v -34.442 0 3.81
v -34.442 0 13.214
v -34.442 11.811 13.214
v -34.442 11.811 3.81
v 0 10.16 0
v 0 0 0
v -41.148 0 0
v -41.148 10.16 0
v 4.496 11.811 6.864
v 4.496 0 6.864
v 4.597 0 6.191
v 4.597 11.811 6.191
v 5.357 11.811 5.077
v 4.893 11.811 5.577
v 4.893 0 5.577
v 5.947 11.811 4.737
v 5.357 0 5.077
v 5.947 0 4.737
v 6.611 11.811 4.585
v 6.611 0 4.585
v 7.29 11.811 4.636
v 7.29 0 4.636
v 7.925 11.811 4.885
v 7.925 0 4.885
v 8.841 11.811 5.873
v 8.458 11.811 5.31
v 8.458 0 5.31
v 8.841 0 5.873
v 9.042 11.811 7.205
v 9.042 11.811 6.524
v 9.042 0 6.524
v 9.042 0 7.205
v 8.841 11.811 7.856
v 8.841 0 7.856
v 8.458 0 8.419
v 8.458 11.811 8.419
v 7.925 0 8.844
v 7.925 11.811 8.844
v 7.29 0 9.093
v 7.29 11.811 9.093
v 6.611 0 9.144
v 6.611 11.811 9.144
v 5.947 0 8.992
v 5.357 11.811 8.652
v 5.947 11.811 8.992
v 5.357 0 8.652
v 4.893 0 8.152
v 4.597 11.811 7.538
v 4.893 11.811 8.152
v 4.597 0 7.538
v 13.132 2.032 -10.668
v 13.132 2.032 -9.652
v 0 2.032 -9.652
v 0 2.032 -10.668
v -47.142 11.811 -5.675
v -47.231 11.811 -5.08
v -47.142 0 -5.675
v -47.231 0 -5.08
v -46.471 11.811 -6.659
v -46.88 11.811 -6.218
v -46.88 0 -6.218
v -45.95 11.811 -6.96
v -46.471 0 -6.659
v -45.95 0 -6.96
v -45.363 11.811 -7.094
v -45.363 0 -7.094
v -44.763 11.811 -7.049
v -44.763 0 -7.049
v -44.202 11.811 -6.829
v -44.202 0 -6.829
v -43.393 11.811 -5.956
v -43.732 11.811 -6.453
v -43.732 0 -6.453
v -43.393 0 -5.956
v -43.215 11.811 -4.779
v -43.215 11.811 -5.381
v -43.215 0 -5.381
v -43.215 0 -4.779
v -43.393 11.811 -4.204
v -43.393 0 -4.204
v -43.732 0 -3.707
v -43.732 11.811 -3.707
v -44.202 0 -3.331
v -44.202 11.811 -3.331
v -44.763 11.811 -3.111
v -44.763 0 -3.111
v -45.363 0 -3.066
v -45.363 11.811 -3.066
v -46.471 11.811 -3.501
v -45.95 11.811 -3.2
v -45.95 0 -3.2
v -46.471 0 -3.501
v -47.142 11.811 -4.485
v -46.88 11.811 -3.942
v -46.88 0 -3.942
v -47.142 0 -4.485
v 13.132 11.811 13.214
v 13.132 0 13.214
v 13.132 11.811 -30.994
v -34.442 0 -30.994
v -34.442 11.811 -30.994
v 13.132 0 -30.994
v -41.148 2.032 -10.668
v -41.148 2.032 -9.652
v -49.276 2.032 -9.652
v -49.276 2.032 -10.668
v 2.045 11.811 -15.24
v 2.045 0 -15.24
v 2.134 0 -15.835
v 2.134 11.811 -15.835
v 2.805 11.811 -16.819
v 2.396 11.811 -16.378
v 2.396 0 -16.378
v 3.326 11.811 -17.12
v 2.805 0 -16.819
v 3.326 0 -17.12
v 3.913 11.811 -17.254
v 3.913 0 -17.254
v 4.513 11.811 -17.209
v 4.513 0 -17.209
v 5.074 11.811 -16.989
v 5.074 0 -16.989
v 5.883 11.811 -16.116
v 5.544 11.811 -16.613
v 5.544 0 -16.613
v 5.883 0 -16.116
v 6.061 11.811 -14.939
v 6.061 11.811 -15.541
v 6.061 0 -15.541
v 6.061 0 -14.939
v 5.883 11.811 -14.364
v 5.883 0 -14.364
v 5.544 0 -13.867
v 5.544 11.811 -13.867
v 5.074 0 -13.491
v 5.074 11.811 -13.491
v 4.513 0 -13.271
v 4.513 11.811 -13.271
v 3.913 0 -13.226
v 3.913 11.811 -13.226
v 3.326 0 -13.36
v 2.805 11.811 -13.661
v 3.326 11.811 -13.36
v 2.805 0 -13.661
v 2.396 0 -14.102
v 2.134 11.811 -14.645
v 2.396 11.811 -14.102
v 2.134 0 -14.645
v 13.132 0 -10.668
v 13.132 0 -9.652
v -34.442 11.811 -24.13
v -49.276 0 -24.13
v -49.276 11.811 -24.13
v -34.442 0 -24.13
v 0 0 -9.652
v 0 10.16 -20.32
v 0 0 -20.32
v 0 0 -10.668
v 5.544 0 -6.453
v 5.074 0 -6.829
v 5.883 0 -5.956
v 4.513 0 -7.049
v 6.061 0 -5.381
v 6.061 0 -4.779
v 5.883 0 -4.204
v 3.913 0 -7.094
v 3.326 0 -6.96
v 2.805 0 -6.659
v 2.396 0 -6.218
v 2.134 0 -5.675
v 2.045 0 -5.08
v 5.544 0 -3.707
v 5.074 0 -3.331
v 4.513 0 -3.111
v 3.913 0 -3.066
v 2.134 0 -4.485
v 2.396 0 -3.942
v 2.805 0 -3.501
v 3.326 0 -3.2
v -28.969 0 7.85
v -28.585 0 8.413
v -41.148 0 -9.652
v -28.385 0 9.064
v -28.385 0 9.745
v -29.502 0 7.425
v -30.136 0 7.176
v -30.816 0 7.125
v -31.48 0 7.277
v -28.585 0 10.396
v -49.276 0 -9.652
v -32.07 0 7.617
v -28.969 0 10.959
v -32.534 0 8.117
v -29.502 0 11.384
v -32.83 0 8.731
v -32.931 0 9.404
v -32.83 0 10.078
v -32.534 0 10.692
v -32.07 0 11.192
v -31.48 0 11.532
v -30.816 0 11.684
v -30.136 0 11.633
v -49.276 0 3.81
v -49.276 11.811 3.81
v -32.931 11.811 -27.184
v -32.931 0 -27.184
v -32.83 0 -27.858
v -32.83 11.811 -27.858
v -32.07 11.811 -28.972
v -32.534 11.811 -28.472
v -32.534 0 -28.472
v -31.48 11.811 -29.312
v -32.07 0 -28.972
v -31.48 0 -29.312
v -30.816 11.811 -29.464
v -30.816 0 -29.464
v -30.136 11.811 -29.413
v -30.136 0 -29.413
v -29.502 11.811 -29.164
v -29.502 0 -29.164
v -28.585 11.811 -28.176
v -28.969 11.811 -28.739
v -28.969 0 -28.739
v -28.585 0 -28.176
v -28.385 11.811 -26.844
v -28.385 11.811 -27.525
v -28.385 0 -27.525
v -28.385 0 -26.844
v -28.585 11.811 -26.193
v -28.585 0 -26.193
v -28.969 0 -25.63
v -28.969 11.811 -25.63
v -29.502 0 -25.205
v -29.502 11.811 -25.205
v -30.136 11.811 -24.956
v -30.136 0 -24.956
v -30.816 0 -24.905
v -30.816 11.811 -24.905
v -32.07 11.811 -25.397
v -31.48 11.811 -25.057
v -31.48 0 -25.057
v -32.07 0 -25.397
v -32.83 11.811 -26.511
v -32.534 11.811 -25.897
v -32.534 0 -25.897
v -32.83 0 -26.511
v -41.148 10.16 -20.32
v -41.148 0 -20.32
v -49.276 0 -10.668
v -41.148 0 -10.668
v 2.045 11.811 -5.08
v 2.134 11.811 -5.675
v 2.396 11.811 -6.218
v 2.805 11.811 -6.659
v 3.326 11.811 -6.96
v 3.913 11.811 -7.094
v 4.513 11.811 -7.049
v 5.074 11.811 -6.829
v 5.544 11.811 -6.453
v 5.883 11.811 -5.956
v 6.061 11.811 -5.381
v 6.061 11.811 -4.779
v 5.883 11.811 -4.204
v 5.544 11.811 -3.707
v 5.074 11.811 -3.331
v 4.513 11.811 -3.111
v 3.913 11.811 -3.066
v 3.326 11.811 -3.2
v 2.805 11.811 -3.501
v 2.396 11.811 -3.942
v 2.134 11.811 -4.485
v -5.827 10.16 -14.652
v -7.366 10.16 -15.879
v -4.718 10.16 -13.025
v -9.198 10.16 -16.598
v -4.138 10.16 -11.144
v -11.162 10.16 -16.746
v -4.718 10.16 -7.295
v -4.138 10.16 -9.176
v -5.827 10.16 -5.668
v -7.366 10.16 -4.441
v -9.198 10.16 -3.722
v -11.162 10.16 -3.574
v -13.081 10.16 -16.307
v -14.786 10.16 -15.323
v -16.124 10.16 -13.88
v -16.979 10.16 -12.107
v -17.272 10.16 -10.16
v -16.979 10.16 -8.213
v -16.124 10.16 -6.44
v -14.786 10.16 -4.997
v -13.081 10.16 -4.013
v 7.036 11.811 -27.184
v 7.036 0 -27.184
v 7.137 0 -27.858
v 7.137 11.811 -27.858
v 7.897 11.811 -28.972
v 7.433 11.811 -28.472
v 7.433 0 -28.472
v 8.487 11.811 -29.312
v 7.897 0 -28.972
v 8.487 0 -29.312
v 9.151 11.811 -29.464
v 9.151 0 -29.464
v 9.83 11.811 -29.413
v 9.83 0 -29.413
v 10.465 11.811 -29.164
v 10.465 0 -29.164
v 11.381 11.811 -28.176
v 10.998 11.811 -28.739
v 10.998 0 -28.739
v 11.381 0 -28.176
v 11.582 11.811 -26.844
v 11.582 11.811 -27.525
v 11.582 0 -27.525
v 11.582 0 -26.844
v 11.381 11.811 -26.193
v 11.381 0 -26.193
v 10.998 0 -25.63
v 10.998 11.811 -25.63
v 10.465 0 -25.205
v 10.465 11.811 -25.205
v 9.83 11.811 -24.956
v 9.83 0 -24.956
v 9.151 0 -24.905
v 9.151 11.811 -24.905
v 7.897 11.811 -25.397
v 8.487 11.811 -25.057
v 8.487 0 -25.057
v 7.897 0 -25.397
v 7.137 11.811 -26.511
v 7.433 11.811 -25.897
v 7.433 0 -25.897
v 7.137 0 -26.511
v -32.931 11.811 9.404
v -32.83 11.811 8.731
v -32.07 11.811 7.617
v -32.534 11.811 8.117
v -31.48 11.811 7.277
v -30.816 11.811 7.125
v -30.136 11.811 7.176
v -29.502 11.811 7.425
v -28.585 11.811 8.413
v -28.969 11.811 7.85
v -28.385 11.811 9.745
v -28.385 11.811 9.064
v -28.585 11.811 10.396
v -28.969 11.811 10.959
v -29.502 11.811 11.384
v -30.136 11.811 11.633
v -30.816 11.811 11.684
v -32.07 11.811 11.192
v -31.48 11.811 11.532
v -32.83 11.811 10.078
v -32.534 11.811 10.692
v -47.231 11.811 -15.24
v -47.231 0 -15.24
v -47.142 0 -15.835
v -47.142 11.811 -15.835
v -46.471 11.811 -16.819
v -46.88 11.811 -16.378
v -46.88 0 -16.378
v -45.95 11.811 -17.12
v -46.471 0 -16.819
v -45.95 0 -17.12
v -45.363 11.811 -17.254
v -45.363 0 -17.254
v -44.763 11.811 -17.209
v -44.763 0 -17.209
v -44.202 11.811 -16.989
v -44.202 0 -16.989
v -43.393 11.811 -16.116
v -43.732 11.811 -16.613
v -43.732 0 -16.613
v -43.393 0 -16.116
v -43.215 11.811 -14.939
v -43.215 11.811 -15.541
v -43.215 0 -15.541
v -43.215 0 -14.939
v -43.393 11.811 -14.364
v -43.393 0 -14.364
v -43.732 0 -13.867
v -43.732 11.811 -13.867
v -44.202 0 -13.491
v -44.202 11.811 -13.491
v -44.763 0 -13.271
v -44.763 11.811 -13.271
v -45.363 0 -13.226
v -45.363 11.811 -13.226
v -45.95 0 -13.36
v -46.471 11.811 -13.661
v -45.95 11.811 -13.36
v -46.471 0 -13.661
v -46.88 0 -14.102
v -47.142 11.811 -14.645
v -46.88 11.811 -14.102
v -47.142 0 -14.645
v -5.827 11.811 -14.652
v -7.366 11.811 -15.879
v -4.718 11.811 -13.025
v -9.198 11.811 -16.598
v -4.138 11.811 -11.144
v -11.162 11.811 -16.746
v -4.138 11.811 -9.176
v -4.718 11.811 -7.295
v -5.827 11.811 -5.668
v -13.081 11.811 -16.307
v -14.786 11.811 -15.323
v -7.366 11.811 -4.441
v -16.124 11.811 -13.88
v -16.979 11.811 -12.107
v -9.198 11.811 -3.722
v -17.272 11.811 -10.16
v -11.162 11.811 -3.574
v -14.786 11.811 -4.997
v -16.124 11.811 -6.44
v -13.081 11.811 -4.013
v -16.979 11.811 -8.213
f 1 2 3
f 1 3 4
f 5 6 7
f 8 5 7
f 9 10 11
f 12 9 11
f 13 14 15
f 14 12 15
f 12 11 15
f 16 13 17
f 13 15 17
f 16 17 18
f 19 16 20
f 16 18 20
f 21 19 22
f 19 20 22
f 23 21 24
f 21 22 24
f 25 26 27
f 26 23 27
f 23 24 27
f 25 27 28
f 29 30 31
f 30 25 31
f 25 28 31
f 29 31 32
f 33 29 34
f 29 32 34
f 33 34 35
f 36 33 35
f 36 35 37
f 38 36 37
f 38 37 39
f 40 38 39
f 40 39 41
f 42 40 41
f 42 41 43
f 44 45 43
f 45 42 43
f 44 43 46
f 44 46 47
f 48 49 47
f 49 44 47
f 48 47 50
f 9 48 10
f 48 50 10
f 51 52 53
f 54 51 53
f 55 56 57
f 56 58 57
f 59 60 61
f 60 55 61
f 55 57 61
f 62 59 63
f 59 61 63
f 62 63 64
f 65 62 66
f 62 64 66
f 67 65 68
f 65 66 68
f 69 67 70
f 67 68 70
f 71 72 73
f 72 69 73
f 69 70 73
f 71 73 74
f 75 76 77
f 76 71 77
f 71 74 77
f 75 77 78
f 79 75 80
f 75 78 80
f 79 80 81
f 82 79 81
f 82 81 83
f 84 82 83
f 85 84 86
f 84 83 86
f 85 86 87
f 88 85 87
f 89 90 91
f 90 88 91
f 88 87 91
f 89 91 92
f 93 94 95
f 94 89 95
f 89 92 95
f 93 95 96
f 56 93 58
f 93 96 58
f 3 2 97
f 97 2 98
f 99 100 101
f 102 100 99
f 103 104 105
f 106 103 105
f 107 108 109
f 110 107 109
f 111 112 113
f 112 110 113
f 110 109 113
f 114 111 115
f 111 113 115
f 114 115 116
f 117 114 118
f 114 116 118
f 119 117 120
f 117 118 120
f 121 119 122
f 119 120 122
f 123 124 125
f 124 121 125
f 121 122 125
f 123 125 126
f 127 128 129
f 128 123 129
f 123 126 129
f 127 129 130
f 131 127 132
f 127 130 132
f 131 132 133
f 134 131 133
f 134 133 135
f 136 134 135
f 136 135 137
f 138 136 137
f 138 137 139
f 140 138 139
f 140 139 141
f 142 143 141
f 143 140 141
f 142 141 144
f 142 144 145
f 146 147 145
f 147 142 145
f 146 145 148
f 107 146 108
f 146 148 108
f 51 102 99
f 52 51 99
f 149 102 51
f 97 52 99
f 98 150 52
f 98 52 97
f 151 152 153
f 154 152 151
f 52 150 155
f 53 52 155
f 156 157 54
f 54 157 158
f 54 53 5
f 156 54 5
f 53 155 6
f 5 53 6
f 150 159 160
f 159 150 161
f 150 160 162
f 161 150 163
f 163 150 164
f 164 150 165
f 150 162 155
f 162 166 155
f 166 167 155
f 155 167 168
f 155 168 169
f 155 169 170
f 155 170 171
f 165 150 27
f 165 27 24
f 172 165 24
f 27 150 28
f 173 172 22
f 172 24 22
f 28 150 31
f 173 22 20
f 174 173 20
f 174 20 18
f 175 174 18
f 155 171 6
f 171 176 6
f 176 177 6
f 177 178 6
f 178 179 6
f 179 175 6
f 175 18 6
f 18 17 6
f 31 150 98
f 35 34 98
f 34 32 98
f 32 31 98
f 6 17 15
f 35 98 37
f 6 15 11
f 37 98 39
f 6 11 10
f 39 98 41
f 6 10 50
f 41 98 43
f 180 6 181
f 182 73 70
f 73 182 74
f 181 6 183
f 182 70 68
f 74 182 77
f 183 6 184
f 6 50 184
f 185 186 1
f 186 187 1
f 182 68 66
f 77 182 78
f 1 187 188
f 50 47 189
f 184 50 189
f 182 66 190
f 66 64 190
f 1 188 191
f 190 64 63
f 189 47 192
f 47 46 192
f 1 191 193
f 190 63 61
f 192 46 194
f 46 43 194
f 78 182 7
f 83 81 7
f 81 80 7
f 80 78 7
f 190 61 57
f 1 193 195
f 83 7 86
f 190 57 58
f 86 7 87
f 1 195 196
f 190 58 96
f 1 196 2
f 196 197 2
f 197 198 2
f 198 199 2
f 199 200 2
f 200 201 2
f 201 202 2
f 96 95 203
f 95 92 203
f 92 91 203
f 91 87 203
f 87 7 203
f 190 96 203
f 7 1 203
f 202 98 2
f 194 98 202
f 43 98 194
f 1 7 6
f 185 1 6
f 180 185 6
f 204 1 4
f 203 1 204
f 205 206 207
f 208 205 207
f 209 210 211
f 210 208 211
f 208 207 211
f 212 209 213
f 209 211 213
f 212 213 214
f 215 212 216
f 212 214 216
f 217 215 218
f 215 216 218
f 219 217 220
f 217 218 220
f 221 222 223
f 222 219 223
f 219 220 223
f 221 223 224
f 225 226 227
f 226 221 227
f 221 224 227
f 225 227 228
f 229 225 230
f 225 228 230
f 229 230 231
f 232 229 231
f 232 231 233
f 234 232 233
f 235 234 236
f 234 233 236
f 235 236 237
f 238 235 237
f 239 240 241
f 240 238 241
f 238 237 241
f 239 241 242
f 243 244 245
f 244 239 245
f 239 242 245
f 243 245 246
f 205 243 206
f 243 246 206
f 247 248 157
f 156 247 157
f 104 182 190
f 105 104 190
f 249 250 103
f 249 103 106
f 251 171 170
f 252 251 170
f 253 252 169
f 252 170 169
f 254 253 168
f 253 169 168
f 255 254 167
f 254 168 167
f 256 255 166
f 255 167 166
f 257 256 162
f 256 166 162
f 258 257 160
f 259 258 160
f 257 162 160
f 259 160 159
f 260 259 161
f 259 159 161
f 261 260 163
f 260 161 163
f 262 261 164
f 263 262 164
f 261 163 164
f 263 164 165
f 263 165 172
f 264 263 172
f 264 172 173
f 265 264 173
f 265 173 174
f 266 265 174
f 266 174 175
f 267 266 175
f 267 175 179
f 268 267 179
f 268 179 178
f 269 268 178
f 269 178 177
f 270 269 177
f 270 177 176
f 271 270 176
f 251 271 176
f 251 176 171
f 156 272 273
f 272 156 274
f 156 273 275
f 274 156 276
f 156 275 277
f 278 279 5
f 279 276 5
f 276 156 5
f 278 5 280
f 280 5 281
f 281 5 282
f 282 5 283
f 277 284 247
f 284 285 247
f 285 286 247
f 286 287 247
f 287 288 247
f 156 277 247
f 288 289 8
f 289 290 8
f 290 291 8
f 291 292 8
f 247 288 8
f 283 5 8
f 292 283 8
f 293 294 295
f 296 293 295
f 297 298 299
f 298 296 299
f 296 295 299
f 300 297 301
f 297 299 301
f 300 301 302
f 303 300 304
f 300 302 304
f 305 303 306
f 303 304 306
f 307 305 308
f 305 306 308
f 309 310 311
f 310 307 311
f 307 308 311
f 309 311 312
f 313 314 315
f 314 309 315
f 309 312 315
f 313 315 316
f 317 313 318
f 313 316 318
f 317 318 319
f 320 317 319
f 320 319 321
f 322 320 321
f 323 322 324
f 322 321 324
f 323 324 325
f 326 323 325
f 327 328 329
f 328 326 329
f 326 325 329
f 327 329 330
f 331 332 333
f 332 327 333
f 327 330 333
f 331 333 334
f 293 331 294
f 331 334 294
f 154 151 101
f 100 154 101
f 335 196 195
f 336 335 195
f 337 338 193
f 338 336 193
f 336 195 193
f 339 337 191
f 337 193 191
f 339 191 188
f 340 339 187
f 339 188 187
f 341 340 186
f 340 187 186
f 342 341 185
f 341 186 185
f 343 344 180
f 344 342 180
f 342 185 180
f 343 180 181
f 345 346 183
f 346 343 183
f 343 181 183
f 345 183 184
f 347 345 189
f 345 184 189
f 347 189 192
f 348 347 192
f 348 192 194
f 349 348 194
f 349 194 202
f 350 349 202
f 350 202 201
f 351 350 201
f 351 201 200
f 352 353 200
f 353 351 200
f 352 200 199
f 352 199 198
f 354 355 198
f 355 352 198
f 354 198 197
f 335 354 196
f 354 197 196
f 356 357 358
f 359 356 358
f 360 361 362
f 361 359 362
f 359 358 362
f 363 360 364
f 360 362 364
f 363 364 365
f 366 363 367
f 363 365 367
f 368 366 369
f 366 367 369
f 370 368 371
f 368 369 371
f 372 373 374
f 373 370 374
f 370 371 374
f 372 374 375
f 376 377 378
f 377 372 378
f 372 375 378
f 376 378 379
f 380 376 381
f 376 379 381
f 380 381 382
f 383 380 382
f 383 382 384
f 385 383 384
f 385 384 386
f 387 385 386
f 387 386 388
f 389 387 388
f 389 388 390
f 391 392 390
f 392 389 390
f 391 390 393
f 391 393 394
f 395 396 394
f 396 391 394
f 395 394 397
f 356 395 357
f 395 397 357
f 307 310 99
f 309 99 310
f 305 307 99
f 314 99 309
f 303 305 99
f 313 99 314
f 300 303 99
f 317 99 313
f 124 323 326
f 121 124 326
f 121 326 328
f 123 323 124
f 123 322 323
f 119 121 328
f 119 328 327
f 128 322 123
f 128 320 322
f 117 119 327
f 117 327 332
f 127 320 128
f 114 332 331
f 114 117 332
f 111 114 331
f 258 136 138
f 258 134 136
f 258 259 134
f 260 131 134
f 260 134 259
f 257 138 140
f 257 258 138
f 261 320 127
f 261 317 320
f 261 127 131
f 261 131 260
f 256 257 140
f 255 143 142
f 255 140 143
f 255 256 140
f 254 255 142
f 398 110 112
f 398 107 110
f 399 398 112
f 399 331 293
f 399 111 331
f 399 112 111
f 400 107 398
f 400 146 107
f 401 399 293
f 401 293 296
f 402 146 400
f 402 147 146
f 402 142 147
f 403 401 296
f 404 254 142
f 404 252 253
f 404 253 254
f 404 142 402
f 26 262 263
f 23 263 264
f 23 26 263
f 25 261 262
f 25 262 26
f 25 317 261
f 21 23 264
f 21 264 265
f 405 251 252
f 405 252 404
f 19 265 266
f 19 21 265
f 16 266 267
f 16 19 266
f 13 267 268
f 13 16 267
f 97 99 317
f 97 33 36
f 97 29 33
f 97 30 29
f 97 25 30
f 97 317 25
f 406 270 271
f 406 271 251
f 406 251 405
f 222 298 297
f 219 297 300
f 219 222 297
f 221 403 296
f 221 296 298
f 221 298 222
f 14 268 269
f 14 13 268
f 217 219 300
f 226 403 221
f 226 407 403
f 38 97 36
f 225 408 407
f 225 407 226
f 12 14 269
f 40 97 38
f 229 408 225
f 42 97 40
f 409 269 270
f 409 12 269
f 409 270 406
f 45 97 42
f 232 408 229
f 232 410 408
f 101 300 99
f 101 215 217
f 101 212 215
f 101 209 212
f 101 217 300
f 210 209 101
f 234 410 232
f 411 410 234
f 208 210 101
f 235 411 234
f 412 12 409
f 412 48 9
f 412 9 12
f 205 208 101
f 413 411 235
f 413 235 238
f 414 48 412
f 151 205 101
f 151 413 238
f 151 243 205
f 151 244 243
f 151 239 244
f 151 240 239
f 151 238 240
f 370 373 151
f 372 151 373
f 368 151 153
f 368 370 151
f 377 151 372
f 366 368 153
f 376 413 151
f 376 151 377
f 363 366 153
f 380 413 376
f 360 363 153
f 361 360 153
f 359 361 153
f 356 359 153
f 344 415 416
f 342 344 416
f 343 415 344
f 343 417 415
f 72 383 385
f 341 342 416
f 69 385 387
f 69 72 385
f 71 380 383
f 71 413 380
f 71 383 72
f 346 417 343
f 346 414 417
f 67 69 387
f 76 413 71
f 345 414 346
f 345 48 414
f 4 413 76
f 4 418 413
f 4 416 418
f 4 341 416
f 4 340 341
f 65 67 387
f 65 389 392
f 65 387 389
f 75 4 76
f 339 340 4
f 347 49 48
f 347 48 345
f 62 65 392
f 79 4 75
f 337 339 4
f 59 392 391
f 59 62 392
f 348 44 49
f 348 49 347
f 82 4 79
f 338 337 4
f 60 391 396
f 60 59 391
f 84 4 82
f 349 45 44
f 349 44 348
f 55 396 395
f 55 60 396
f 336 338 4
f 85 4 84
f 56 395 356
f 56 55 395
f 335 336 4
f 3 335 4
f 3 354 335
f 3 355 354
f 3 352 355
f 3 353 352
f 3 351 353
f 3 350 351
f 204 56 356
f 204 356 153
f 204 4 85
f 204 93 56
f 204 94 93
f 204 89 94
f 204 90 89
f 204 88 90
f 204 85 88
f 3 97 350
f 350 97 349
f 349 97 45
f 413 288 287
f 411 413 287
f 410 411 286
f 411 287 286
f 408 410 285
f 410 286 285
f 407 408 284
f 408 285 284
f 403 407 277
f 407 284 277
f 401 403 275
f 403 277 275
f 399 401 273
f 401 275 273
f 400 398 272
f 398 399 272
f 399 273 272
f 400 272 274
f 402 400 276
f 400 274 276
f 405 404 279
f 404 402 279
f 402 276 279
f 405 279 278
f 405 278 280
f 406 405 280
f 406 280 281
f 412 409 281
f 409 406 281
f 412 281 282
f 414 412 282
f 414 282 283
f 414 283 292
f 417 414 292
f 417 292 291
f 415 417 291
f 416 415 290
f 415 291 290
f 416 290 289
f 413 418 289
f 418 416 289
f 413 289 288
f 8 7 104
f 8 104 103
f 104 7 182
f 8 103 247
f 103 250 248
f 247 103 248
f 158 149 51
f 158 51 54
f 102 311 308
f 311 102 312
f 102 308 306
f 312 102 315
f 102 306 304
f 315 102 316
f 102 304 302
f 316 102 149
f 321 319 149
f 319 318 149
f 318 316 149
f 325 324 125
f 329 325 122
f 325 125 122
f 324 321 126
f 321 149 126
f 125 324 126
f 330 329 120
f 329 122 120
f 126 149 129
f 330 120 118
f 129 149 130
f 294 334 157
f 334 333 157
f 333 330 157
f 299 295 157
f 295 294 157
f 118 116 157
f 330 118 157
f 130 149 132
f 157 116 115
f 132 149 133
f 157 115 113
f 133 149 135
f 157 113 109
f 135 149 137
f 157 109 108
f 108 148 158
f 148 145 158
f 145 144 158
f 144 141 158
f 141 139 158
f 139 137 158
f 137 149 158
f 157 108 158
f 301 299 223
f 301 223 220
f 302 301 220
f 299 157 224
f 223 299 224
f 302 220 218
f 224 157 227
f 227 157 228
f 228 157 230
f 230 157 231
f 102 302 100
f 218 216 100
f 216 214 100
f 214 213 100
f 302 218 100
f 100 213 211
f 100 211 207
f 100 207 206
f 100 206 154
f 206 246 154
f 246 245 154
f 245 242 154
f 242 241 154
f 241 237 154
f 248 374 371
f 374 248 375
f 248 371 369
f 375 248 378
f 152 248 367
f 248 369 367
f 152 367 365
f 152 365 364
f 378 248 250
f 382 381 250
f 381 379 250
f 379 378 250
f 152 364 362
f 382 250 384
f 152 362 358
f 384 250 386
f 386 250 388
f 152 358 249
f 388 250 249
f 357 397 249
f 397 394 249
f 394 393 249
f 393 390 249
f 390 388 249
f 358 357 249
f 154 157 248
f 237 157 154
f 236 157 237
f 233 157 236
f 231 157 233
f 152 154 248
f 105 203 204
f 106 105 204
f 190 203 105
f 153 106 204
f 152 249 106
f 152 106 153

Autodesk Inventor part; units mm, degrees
ref_plane "YZ Plane" through (0, 0, 0) normal (1, 0, 0) x (0, 1, 0)
ref_plane "XZ Plane" through (0, 0, 0) normal (0, 1, 0) x (-1, 0, 0)
ref_plane "XY Plane" through (0, 0, 0) normal (0, 0, 1) x (1, 0, 0)
sketch "Sketch1" plane through (0, 0, 0) normal (0, 1, 0) x (-1, 0, 0)
  line L0 (0, 0) -> (41.148, 0)
  line L1 (41.148, 0) -> (41.148, -20.32)
  line L2 (41.148, -20.32) -> (0, -20.32)
  line L3 (0, -20.32) -> (0, 0)
  circle A0 centre (45.212, -15.24) radius 2.0193
  circle A1 centre (-4.064, -15.24) radius 2.0193
  circle A2 centre (45.212, -5.08) radius 2.0193
  circle A3 centre (-4.064, -5.08) radius 2.0193
  line L4 (41.148, -9.652) -> (49.276, -9.652)
  line L5 (41.148, -10.668) -> (49.276, -10.668)
  line L6 (-13.1318, -9.652) -> (0, -9.652)
  line L7 (-13.1318, -10.668) -> (0, -10.668)
  line L8 (-13.1318, 3.81) -> (49.276, 3.81)
  line L9 (49.276, 3.81) -> (49.276, -24.13)
  line L10 (49.276, -24.13) -> (-13.1318, -24.13)
  line L11 (-13.1318, -30.9945) -> (-13.1318, 13.2145)
  line L12 (-6.155, -5.4575) -> (-6.0508, -5.4409)
  line L13 (-6.155, -5.4575) -> (-6.0508, -5.4409)
  line L14 (20.574, -20.32) -> (20.574, 0)
  circle A4 centre (10.668, -10.16) radius 6.604
  circle A5 centre (-6.7818, 6.8645) radius 2.0193
  circle A6 centre (30.6451, 9.4045) radius 2.0193
  circle A7 centre (30.6451, -27.1845) radius 2.0193
  line L15 (10.668, -30.9945) -> (34.4551, -30.9945)
  line L16 (-8.128, -30.9945) -> (34.4551, -30.9945)
  circle A8 centre (-9.3218, -27.1845) radius 2.0193
  line L17 (34.4424, -30.9945) -> (-13.1318, -30.9945)
  line L18 (34.4424, -24.13) -> (34.4424, -30.9945)
  line L19 (34.4424, 13.2145) -> (34.4424, 3.81)
  circle A9 centre (30.6451, 9.4045) radius 2.286
  circle A10 centre (-6.7818, 6.8645) radius 2.286
  circle A11 centre (-9.3218, -27.1845) radius 2.286
  circle A12 centre (30.6451, -27.1845) radius 2.286
  line L20 (34.4424, 3.81) -> (-13.1318, 3.81)
  line L21 (34.4424, 13.2145) -> (-13.1318, 13.2145)
  point P0 (20.574, -10.16)
  point P1 (34.4424, -30.9945)
  point P2 (-11.5492, -24.13)
  point P3 (-7.0944, -24.13)
  dimension "d0" = 41.148
  dimension "d1" = 20.32
  dimension "d4" = 4.0386
  dimension "d5" = 4.0386
  dimension "d18" = 4.064
  dimension "d19" = 4.064
  dimension "d52" = 8.128
  dimension "d53" = 13.1318
  dimension "d54" = 3.81
  dimension "d55" = 3.81
  dimension "d59" = 9.906
  dimension "d60" = 13.208
  dimension "d79" = 4.0386
  dimension "d80" = 4.0386
  dimension "d81" = 4.0386
  dimension "d82" = 4.0386
  dimension "d84" = 3.81
  dimension "d91" = 4.572
  dimension "d92" = 4.572
  dimension "d93" = 4.572
  dimension "d94" = 4.572
  dimension "d96" = 3.81
  dimension "d97" = 3.81
  dimension "d98" = 6.35
  dimension "d100" = 6.35
  dimension "d101" = 9.4045
  dimension "d102" = 47.5742
  dimension "d103" = 47.5742
extrude "Extrusion10" add sketch "Sketch1" along normal blind 11.811 contours L3 L6 L11 L8 L9 L4 L1 L0 | L0 L14 L2 L3 | L0 L1 L2 L14 | L3 L7 L11 L6 | L2 L1 L5 L9 L10 L11 L7 L3 | L4 L9 L5 L1 | L11 L21 L19 L8 | L10 L18 L15 L16 L17 L11
extrude "Extrusion11" cut sketch "Sketch1" along normal blind 10.16 contours L0 L14 L2 L3 | L0 L1 L2 L14
extrude "Extrusion12" cut sketch "Sketch1" along normal blind 2.032 contours L3 L7 L11 L6 | L4 L9 L5 L1
properties part number "Servo Mount"
